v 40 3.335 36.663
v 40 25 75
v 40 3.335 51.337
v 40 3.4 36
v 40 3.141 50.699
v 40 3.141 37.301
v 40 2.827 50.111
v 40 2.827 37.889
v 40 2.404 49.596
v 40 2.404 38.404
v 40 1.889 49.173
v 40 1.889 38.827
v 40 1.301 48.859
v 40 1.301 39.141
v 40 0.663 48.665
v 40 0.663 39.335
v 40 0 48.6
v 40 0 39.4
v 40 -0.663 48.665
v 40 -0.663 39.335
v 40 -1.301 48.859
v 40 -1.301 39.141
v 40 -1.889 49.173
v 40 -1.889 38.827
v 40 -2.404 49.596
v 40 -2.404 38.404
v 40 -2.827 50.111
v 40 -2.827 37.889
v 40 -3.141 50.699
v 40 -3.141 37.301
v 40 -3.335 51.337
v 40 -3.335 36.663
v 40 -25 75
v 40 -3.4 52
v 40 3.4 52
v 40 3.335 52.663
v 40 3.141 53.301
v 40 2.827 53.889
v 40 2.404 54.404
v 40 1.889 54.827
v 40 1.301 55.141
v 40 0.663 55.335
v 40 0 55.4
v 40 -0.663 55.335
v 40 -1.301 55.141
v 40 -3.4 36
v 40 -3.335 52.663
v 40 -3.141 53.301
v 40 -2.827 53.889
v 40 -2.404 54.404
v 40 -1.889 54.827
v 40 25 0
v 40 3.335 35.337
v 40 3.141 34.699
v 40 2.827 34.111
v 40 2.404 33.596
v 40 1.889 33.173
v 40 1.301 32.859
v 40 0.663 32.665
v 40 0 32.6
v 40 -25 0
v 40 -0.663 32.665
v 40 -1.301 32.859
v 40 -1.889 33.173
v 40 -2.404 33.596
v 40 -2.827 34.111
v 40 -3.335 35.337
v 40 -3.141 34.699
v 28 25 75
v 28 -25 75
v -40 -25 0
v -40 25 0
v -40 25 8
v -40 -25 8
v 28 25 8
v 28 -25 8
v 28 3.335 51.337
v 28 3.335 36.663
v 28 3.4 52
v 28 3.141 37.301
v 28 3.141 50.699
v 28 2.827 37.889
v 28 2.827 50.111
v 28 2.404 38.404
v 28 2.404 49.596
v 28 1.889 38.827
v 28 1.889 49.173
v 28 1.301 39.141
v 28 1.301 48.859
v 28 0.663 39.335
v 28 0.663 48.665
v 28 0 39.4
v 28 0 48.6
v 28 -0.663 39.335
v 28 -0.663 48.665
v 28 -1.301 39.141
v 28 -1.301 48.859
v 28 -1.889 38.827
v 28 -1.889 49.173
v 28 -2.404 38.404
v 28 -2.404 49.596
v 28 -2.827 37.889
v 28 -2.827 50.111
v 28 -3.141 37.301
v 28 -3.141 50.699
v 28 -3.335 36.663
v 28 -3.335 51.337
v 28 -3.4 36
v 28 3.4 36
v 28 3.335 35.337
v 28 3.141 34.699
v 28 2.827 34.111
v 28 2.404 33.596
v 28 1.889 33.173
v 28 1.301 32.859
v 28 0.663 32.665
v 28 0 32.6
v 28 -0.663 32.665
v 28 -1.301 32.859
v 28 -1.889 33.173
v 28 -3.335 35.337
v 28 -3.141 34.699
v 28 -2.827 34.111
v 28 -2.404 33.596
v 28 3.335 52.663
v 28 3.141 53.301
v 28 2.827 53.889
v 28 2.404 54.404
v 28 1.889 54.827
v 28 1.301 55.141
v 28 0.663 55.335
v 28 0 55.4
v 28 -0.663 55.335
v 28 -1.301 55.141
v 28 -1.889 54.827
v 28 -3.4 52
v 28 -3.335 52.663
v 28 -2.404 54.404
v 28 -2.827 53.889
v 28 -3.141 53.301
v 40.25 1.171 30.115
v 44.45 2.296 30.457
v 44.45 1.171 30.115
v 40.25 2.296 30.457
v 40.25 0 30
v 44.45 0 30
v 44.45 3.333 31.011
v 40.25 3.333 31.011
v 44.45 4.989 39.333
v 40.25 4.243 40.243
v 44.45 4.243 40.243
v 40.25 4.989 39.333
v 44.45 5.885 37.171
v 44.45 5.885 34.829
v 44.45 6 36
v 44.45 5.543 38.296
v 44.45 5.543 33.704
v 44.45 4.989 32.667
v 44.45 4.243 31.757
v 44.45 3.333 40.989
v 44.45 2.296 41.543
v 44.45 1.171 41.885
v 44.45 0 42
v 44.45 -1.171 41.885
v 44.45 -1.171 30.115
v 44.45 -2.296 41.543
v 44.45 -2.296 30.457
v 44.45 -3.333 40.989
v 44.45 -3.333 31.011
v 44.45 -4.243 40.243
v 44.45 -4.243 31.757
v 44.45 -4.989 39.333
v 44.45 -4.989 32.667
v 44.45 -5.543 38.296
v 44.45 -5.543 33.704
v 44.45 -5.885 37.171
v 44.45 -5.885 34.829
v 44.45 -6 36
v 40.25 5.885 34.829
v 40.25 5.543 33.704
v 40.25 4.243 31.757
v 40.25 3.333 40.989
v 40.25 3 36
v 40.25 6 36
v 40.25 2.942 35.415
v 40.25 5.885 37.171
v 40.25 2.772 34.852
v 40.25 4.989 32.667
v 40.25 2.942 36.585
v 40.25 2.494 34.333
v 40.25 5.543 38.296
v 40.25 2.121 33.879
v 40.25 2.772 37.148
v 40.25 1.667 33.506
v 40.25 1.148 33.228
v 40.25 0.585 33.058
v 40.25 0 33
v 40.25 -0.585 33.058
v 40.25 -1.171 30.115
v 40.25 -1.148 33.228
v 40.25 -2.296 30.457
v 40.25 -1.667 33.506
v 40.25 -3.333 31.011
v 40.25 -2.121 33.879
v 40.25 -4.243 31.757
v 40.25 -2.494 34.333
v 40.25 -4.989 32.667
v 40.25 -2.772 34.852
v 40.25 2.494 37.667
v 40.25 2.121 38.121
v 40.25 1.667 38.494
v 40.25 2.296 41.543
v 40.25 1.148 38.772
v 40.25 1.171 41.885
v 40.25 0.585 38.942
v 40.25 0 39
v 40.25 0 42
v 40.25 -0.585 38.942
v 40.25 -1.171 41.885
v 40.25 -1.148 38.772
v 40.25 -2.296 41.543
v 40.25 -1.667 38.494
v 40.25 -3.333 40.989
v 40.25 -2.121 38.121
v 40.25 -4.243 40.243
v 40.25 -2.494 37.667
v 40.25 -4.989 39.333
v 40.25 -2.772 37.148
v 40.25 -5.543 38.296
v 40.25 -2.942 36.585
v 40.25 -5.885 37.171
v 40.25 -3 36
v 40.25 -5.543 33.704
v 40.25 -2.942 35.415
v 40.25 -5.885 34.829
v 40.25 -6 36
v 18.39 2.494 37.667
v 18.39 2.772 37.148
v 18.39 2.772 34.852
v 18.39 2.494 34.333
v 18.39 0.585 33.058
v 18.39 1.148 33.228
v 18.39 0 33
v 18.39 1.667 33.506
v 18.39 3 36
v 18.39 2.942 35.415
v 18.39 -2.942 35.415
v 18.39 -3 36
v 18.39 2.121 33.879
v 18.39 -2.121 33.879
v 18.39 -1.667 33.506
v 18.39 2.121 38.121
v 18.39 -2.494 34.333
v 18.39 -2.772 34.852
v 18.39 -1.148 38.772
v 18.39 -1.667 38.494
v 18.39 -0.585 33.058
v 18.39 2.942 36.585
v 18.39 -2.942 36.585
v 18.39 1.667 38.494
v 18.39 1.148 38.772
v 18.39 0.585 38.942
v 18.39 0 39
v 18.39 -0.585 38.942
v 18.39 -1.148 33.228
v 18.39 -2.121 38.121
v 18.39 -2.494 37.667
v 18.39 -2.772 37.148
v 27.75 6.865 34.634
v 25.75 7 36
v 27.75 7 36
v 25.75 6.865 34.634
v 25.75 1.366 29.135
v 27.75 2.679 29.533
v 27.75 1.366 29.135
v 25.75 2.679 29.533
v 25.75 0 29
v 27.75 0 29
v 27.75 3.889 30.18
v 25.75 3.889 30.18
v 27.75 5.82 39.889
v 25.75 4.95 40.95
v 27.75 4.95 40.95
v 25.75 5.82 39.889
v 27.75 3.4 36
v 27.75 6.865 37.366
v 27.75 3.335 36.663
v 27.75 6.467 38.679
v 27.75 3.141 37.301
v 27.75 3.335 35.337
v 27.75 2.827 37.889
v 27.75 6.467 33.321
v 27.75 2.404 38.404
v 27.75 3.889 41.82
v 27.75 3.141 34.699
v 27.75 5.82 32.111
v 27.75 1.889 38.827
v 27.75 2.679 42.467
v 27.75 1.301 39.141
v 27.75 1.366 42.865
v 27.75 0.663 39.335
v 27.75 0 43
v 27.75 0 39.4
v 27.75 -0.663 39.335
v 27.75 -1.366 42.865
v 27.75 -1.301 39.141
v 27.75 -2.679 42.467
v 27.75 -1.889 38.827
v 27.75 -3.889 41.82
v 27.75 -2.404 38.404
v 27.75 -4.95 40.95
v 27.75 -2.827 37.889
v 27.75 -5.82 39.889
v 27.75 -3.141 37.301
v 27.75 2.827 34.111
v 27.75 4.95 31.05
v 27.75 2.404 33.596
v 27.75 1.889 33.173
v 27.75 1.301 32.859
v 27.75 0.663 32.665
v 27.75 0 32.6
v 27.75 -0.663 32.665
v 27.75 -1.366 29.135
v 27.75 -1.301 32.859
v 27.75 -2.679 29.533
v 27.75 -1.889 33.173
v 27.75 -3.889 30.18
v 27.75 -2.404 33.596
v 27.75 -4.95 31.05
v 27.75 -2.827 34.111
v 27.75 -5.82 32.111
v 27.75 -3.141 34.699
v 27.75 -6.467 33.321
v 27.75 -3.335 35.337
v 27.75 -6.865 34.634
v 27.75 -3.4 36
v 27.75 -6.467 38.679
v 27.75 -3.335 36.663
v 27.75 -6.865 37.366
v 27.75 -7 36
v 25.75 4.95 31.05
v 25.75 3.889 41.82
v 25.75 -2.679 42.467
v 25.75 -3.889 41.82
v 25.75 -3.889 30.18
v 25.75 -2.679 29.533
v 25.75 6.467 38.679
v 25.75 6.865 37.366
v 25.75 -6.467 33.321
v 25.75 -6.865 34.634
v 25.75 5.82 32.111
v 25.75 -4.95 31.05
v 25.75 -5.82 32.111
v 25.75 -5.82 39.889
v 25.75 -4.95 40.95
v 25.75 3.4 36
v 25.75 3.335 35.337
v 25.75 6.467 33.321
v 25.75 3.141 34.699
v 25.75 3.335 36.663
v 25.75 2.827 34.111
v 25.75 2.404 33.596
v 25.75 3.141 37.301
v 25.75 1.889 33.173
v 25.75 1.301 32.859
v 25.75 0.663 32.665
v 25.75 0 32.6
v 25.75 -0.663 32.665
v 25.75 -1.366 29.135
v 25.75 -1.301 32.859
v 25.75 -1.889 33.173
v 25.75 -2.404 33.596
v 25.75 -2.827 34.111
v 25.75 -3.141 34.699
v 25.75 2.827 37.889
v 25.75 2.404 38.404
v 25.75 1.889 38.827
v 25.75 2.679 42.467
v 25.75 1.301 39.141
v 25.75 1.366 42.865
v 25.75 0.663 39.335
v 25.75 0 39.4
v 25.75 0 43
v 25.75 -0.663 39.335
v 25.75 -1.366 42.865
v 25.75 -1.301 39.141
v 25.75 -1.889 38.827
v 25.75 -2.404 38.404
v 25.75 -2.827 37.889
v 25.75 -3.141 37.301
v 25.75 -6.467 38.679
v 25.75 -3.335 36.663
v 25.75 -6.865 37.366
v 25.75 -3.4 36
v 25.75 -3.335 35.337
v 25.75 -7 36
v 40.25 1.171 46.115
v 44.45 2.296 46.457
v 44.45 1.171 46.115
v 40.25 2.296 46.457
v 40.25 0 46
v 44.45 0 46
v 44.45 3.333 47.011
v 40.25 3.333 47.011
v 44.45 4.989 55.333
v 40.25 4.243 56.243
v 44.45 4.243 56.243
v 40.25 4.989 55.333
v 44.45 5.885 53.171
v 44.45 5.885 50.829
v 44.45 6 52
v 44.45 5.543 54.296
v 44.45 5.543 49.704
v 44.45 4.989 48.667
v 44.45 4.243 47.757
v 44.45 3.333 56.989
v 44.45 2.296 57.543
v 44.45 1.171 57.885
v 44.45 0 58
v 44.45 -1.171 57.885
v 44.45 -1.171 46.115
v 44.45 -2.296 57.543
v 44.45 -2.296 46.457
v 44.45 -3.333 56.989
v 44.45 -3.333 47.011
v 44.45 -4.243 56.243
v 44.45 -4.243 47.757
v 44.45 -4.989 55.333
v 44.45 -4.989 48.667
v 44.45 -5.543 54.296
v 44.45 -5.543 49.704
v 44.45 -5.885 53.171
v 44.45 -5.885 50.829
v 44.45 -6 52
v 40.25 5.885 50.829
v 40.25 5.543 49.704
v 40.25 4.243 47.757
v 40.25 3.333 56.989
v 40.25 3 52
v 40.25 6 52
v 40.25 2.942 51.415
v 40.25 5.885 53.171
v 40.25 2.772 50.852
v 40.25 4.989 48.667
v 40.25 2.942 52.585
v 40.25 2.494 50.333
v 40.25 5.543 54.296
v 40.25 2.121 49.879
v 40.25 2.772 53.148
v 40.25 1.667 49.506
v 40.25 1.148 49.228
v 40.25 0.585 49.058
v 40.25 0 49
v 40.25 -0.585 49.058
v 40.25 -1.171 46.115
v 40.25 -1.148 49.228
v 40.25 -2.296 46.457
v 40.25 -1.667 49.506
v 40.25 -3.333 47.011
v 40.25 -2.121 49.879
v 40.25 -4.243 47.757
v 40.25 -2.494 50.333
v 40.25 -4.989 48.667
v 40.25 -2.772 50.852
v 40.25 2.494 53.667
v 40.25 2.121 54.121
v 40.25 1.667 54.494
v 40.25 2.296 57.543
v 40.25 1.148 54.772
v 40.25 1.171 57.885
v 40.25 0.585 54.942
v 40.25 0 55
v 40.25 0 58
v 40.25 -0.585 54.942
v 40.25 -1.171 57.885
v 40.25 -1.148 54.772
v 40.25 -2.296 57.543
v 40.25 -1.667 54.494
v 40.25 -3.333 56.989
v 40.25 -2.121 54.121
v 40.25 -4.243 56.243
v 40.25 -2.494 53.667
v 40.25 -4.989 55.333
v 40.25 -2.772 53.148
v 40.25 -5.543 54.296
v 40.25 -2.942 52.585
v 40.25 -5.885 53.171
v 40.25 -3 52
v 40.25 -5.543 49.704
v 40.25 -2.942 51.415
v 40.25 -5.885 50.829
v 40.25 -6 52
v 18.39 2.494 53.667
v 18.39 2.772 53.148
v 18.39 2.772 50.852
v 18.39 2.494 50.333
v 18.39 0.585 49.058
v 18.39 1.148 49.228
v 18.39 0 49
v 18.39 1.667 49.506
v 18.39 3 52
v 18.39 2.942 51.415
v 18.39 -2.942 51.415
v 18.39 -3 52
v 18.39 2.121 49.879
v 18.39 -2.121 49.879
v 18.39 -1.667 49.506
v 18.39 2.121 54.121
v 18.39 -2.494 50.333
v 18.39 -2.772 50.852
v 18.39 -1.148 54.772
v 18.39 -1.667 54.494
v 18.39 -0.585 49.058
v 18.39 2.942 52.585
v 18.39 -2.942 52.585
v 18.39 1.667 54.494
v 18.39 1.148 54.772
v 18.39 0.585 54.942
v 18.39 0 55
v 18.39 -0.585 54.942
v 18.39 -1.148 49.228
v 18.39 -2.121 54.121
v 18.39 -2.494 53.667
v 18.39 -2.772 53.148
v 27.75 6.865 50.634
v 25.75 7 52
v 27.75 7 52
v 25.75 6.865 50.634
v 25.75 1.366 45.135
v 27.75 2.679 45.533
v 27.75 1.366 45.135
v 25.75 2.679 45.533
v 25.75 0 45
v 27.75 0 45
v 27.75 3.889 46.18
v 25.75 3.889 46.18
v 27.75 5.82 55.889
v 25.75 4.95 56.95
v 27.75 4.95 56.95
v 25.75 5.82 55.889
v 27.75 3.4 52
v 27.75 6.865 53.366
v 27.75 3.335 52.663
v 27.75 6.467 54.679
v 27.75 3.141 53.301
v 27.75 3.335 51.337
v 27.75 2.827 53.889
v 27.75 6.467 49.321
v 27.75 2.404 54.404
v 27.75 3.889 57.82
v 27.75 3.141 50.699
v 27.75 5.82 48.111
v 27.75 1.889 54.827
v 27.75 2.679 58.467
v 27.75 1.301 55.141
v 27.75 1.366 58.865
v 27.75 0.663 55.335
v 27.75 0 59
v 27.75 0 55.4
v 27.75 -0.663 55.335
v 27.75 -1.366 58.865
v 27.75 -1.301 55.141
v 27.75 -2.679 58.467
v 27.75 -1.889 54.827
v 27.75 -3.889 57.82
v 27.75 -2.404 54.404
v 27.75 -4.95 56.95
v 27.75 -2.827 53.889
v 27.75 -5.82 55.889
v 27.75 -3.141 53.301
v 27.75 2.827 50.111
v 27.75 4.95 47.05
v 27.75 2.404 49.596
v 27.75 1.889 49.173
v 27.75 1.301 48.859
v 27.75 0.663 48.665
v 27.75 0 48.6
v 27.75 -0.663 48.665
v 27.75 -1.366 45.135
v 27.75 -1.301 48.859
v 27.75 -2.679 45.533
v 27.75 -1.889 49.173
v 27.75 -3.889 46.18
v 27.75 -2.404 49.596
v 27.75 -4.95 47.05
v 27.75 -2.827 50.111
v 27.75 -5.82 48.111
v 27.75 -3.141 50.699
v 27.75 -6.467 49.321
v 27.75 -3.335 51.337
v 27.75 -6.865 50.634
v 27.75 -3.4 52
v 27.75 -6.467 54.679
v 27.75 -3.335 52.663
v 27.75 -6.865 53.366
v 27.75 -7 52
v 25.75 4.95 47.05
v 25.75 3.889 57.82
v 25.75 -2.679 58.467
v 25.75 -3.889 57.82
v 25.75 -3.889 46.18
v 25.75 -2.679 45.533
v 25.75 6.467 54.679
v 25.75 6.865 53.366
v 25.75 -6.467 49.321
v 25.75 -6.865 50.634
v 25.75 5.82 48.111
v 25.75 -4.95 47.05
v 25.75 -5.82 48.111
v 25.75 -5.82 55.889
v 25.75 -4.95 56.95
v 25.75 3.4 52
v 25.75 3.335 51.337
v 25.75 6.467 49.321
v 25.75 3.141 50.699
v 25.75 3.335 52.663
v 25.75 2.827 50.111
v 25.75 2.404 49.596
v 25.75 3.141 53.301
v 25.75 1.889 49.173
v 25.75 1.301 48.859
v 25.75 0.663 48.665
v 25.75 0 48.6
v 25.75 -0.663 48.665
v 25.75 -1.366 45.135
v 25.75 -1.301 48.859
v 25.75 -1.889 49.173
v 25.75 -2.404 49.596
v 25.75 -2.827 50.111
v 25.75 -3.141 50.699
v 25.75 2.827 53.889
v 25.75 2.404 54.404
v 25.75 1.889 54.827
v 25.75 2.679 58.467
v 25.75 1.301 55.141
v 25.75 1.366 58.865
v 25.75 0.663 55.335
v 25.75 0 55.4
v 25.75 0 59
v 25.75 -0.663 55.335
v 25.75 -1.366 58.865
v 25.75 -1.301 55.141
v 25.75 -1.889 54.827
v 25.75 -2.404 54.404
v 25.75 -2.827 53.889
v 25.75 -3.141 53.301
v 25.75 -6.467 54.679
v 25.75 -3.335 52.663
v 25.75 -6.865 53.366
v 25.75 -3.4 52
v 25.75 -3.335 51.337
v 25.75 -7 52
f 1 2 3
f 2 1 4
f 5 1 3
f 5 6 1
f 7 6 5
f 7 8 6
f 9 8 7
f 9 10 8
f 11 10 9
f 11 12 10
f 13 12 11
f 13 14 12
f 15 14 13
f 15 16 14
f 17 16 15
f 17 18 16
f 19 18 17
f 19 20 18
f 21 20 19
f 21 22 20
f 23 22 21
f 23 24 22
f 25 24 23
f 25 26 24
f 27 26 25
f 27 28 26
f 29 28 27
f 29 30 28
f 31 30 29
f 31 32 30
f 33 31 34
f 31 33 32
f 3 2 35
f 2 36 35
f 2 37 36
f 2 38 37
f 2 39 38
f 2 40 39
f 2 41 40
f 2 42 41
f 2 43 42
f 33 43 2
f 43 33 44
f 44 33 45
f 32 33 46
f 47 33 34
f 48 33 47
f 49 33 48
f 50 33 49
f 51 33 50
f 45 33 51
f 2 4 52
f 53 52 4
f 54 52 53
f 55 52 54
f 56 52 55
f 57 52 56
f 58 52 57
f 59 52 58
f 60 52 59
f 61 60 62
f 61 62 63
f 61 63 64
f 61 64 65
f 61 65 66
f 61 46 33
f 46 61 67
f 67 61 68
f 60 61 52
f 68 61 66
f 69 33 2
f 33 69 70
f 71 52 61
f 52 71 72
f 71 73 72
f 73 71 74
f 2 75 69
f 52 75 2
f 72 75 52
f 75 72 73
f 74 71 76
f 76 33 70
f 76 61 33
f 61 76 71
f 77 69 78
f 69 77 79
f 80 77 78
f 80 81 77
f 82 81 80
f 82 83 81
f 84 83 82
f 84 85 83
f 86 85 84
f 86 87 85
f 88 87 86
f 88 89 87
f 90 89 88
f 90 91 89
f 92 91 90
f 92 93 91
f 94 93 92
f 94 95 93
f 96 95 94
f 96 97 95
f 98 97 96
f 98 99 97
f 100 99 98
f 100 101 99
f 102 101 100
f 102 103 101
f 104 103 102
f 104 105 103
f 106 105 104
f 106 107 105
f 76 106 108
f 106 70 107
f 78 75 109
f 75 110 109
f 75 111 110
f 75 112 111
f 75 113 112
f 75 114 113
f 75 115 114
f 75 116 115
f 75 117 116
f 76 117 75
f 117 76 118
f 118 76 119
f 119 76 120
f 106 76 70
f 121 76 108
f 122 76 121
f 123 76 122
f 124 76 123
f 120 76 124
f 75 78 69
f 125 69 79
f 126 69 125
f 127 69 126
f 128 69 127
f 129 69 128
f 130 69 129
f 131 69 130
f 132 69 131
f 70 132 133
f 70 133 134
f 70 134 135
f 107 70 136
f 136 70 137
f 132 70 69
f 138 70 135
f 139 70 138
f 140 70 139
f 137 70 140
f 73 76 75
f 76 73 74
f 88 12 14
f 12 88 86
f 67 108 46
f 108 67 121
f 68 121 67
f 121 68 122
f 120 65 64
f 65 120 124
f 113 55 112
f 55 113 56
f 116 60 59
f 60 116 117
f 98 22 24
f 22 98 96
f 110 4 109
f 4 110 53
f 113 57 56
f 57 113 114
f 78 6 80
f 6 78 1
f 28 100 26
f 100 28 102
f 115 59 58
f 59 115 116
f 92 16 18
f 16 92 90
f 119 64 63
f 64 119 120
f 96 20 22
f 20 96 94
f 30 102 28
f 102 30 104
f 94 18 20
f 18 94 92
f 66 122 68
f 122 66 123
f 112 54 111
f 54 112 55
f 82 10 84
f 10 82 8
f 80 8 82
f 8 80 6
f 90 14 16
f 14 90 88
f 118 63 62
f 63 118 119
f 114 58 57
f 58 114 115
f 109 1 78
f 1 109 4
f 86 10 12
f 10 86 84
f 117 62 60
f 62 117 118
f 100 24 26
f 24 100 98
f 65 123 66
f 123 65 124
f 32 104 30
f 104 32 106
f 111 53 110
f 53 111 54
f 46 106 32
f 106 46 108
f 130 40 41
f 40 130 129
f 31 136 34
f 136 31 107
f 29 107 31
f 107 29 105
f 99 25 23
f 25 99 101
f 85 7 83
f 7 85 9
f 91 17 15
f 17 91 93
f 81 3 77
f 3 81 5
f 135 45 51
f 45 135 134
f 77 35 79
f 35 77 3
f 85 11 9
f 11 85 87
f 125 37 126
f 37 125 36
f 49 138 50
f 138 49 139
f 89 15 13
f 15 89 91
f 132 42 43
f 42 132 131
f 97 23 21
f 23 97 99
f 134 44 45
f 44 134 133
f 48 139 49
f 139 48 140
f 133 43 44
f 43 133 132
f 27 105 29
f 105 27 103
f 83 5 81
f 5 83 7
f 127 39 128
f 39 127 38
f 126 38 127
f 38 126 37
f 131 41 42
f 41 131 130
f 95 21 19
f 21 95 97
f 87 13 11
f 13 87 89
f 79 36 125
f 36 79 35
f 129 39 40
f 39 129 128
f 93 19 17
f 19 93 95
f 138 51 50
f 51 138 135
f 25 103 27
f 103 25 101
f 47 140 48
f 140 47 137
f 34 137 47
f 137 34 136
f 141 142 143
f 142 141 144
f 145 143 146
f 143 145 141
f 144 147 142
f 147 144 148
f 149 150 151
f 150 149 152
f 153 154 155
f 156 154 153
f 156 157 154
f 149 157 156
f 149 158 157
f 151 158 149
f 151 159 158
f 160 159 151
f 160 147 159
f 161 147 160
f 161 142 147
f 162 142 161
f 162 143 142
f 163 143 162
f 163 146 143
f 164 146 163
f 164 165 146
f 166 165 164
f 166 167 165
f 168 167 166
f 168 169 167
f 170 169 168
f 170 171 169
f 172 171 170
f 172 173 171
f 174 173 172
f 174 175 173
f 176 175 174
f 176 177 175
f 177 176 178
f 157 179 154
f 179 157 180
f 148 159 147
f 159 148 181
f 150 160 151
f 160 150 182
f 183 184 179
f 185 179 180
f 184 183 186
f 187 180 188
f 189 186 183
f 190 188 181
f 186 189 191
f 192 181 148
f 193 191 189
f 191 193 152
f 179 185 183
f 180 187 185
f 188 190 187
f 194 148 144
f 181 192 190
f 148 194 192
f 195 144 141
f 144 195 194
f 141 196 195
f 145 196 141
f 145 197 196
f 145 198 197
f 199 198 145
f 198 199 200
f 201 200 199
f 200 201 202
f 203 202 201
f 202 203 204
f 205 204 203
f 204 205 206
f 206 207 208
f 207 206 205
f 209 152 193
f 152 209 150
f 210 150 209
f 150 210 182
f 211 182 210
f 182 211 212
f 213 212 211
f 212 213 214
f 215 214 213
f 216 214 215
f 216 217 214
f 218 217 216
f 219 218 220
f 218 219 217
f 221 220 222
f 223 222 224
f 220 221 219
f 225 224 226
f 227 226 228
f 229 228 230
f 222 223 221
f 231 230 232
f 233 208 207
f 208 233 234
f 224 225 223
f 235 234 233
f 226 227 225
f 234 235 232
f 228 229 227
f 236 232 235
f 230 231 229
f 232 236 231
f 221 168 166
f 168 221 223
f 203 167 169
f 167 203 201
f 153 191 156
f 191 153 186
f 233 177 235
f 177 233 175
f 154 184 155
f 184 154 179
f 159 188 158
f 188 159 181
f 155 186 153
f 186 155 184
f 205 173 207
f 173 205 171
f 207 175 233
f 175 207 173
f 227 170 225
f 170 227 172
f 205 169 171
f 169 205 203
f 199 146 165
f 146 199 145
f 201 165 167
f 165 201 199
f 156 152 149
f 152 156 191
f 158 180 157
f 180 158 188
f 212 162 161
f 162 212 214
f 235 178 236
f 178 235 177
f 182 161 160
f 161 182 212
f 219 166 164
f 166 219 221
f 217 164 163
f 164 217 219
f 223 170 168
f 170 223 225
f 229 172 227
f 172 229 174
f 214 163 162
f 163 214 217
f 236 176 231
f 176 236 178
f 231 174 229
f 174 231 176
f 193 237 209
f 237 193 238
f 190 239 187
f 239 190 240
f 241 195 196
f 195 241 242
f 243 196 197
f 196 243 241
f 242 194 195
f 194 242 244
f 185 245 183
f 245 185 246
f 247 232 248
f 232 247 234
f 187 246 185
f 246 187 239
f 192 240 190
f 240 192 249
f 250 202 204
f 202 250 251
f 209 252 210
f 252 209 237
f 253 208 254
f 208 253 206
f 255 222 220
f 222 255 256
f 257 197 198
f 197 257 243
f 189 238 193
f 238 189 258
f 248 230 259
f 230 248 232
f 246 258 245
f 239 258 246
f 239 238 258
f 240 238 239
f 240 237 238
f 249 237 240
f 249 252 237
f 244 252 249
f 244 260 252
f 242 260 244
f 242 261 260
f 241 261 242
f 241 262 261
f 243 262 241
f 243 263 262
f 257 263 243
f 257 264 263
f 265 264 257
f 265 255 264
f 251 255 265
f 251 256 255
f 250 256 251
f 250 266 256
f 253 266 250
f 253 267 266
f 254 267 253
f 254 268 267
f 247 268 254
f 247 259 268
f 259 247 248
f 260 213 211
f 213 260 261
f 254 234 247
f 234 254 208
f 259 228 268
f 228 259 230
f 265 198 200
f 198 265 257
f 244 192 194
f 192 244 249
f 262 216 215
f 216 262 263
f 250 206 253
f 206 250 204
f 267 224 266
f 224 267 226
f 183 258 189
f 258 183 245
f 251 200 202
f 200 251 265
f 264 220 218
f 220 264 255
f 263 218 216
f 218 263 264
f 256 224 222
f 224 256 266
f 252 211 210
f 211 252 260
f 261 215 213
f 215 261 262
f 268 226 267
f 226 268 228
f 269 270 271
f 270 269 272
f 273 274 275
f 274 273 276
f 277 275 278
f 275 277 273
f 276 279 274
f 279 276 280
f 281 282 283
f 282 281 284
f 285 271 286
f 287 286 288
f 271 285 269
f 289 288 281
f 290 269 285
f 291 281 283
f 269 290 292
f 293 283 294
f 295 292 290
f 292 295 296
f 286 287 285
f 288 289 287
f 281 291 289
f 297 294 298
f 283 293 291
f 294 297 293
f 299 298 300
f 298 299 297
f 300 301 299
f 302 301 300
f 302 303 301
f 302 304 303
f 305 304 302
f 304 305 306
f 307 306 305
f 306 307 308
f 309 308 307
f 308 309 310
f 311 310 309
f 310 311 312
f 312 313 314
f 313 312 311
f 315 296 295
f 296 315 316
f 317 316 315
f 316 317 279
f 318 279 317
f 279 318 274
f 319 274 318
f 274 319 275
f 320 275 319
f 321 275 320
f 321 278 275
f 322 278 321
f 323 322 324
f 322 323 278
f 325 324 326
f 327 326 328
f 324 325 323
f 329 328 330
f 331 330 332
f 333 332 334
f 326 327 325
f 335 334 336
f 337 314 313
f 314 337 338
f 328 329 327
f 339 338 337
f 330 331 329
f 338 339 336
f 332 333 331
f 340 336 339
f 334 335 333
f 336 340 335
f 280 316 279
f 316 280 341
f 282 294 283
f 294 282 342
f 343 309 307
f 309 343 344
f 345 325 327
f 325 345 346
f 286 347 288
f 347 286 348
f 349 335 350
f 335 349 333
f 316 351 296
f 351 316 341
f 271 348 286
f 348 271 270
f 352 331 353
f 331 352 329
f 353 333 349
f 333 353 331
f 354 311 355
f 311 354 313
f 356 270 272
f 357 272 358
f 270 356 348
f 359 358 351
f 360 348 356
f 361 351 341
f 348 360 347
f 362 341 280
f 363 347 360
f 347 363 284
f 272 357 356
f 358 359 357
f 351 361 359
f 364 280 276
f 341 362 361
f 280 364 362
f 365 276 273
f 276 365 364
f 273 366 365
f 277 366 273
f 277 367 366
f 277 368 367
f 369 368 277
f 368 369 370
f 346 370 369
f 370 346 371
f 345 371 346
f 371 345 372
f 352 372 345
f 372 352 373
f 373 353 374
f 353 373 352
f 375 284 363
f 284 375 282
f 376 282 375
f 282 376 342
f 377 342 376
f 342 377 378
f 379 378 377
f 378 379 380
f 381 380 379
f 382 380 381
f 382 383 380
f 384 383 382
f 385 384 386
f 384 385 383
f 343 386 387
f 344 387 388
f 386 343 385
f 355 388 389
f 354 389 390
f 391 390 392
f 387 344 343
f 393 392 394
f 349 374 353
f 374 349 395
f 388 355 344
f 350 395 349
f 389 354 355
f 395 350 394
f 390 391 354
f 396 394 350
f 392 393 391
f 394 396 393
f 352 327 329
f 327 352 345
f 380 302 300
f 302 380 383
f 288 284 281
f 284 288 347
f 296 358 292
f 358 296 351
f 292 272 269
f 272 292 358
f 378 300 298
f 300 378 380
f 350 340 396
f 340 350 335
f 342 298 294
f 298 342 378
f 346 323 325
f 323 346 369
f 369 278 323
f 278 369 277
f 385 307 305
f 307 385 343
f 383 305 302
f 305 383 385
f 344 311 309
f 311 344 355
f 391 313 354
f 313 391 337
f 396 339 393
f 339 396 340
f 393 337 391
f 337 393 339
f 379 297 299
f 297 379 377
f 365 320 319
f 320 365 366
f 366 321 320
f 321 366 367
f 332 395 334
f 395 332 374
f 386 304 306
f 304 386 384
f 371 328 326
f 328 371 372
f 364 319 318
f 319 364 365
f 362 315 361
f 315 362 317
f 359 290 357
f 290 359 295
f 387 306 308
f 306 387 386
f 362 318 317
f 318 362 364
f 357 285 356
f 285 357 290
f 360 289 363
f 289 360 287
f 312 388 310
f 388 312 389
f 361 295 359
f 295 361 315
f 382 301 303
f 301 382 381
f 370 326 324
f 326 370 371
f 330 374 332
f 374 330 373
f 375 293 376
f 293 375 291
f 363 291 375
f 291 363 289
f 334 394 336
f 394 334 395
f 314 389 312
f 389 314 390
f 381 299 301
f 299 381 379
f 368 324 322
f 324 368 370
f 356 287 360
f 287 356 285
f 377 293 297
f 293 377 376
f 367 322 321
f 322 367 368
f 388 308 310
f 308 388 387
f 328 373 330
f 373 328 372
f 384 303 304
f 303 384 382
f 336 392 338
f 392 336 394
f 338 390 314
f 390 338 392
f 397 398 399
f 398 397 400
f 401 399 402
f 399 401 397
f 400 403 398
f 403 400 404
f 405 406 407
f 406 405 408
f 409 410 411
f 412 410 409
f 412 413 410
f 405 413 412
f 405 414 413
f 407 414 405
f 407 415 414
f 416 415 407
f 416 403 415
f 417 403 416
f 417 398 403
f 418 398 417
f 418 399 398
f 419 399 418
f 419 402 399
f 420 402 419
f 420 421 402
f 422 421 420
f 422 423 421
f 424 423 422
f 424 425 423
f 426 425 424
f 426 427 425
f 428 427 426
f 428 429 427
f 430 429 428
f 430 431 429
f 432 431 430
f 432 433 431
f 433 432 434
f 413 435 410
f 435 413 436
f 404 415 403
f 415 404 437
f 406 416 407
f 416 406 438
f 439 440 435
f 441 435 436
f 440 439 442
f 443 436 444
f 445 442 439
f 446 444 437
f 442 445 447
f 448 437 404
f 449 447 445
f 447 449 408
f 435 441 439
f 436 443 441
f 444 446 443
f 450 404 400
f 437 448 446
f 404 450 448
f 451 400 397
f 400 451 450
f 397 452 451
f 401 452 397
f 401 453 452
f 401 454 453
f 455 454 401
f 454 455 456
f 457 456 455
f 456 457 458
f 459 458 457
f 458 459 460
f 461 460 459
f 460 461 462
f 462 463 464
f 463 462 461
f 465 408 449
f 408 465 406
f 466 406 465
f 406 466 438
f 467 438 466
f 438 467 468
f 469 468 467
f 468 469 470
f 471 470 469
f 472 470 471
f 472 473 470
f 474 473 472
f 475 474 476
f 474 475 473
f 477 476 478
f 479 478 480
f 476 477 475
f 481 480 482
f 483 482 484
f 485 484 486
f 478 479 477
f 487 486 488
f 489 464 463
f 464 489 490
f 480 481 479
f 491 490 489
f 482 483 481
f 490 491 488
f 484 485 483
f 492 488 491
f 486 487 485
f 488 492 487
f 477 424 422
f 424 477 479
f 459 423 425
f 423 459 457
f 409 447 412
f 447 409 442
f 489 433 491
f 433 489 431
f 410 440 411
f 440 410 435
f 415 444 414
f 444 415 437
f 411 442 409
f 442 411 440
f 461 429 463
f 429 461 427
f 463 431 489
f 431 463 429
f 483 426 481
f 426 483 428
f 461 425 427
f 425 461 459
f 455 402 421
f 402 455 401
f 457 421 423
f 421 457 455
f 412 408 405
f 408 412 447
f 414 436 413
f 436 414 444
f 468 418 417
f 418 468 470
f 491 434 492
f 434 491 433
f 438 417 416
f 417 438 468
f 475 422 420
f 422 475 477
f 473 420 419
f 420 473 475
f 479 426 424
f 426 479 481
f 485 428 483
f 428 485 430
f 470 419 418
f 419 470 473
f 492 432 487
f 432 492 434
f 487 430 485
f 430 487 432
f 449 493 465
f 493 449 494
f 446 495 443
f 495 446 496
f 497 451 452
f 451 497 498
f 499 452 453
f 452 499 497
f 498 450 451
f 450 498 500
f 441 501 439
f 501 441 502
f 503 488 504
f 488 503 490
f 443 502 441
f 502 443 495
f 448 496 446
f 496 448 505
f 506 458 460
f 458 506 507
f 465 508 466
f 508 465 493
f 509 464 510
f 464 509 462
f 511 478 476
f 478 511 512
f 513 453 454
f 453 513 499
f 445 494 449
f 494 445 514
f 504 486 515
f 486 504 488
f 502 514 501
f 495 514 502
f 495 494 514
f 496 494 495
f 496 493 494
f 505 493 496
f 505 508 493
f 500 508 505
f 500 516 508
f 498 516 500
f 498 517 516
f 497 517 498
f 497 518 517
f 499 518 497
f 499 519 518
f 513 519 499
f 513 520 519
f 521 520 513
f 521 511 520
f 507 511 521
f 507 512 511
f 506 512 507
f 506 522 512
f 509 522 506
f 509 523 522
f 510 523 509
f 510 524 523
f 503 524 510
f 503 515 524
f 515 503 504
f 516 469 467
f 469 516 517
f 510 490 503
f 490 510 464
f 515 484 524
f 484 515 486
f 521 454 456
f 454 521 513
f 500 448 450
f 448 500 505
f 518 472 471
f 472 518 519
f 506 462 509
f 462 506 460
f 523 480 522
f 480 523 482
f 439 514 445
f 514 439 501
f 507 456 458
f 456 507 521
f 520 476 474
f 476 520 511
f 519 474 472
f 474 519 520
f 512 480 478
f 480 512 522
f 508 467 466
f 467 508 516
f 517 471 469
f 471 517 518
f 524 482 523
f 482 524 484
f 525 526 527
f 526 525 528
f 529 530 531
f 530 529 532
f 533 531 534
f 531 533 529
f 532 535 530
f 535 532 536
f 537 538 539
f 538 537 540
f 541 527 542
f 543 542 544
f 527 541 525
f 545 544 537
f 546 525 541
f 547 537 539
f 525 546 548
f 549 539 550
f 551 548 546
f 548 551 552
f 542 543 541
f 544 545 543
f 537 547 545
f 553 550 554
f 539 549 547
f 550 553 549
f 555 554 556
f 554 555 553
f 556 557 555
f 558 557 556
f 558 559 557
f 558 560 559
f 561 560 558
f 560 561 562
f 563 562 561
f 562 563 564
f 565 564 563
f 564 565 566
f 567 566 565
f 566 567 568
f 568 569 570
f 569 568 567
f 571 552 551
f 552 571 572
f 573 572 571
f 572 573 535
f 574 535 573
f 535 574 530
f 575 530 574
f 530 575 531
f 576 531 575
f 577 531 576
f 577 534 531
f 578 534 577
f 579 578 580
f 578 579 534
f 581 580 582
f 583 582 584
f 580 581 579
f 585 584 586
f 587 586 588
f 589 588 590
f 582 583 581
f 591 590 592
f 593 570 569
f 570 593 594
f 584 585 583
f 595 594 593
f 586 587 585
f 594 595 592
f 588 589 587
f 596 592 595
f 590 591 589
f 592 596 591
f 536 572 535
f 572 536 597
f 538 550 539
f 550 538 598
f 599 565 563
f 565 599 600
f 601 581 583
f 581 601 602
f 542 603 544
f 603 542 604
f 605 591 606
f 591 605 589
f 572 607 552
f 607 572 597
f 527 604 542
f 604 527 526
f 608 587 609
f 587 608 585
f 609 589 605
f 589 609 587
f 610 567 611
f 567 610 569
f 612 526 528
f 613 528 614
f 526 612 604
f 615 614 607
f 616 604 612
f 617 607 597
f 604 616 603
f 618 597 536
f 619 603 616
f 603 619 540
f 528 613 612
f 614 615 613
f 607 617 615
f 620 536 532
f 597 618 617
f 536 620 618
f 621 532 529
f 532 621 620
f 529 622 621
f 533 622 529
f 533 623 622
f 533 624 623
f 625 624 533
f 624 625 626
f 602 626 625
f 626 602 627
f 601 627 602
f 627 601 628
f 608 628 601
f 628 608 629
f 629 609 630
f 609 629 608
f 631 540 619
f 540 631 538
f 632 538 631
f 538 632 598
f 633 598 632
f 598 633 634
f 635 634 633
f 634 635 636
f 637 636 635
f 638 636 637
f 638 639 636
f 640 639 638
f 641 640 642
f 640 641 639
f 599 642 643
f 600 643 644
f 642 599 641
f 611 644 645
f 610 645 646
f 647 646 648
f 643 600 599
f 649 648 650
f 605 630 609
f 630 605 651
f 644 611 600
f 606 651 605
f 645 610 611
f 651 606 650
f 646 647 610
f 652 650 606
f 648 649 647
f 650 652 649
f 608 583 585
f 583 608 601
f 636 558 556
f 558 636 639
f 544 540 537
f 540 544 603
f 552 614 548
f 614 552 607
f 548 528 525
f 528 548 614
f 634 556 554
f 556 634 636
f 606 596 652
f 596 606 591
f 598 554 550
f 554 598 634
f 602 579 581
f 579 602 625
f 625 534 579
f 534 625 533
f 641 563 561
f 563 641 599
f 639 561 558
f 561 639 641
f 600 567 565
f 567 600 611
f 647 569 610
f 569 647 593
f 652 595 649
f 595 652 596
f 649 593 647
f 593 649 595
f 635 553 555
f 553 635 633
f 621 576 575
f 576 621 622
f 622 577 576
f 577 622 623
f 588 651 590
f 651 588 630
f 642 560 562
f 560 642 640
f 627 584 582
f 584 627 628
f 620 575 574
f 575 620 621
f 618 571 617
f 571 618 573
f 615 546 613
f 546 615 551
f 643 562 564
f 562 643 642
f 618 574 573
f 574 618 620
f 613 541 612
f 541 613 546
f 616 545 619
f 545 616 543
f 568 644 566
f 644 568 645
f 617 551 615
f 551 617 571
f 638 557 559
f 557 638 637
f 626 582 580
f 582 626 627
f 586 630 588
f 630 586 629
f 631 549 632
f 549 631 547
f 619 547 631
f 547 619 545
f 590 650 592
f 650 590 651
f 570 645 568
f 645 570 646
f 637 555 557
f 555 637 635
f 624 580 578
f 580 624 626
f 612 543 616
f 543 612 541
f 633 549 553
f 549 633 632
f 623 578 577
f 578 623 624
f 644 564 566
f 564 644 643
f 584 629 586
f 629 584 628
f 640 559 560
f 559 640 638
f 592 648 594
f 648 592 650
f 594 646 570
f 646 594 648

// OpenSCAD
$fn = 32;

// ------------------------------------------------------------------------
// Bolted bracket: 80 x 50 mm bracket with 2 bolt joints
// Every part is its own module, assembly() places them once.
// ------------------------------------------------------------------------

// --- part 1 ---
module bracket() {
  difference() {
    translate([-40, -25, 0]) cube([80, 50, 75]);
    translate([-41, -26, 8]) cube([69, 52, 68]);
    translate([34, 0, 36]) rotate([0, 90, 0]) cylinder(h = 14, d = 6.8, center = true);
    translate([34, 0, 52]) rotate([0, 90, 0]) cylinder(h = 14, d = 6.8, center = true);
  }
}

// --- part 2 ---
module bolt1() {
  cylinder(h = 4.2, d = 12);
  translate([0, 0, -21.86]) cylinder(h = 21.86, d = 6);
}

// --- part 3 ---
module washer1() {
  difference() {
      translate([0, 0, 0]) cylinder(h = 2, d = 14);
      translate([0, 0, -1]) cylinder(h = 4, d = 6.8);
    }
}

// --- part 4 ---
module bolt2() {
  cylinder(h = 4.2, d = 12);
  translate([0, 0, -21.86]) cylinder(h = 21.86, d = 6);
}

// --- part 5 ---
module washer2() {
  difference() {
      translate([0, 0, 0]) cylinder(h = 2, d = 14);
      translate([0, 0, -1]) cylinder(h = 4, d = 6.8);
    }
}

// --- assembly ---
module assembly() {
  translate([0, 0, 0]) rotate([0, 0, 0]) bracket();
  translate([40.25, 0, 36]) rotate([0, 90, 0]) bolt1();
  translate([25.75, 0, 36]) rotate([0, 90, 0]) washer1();
  translate([40.25, 0, 52]) rotate([0, 90, 0]) bolt2();
  translate([25.75, 0, 52]) rotate([0, 90, 0]) washer2();
}

assembly();
